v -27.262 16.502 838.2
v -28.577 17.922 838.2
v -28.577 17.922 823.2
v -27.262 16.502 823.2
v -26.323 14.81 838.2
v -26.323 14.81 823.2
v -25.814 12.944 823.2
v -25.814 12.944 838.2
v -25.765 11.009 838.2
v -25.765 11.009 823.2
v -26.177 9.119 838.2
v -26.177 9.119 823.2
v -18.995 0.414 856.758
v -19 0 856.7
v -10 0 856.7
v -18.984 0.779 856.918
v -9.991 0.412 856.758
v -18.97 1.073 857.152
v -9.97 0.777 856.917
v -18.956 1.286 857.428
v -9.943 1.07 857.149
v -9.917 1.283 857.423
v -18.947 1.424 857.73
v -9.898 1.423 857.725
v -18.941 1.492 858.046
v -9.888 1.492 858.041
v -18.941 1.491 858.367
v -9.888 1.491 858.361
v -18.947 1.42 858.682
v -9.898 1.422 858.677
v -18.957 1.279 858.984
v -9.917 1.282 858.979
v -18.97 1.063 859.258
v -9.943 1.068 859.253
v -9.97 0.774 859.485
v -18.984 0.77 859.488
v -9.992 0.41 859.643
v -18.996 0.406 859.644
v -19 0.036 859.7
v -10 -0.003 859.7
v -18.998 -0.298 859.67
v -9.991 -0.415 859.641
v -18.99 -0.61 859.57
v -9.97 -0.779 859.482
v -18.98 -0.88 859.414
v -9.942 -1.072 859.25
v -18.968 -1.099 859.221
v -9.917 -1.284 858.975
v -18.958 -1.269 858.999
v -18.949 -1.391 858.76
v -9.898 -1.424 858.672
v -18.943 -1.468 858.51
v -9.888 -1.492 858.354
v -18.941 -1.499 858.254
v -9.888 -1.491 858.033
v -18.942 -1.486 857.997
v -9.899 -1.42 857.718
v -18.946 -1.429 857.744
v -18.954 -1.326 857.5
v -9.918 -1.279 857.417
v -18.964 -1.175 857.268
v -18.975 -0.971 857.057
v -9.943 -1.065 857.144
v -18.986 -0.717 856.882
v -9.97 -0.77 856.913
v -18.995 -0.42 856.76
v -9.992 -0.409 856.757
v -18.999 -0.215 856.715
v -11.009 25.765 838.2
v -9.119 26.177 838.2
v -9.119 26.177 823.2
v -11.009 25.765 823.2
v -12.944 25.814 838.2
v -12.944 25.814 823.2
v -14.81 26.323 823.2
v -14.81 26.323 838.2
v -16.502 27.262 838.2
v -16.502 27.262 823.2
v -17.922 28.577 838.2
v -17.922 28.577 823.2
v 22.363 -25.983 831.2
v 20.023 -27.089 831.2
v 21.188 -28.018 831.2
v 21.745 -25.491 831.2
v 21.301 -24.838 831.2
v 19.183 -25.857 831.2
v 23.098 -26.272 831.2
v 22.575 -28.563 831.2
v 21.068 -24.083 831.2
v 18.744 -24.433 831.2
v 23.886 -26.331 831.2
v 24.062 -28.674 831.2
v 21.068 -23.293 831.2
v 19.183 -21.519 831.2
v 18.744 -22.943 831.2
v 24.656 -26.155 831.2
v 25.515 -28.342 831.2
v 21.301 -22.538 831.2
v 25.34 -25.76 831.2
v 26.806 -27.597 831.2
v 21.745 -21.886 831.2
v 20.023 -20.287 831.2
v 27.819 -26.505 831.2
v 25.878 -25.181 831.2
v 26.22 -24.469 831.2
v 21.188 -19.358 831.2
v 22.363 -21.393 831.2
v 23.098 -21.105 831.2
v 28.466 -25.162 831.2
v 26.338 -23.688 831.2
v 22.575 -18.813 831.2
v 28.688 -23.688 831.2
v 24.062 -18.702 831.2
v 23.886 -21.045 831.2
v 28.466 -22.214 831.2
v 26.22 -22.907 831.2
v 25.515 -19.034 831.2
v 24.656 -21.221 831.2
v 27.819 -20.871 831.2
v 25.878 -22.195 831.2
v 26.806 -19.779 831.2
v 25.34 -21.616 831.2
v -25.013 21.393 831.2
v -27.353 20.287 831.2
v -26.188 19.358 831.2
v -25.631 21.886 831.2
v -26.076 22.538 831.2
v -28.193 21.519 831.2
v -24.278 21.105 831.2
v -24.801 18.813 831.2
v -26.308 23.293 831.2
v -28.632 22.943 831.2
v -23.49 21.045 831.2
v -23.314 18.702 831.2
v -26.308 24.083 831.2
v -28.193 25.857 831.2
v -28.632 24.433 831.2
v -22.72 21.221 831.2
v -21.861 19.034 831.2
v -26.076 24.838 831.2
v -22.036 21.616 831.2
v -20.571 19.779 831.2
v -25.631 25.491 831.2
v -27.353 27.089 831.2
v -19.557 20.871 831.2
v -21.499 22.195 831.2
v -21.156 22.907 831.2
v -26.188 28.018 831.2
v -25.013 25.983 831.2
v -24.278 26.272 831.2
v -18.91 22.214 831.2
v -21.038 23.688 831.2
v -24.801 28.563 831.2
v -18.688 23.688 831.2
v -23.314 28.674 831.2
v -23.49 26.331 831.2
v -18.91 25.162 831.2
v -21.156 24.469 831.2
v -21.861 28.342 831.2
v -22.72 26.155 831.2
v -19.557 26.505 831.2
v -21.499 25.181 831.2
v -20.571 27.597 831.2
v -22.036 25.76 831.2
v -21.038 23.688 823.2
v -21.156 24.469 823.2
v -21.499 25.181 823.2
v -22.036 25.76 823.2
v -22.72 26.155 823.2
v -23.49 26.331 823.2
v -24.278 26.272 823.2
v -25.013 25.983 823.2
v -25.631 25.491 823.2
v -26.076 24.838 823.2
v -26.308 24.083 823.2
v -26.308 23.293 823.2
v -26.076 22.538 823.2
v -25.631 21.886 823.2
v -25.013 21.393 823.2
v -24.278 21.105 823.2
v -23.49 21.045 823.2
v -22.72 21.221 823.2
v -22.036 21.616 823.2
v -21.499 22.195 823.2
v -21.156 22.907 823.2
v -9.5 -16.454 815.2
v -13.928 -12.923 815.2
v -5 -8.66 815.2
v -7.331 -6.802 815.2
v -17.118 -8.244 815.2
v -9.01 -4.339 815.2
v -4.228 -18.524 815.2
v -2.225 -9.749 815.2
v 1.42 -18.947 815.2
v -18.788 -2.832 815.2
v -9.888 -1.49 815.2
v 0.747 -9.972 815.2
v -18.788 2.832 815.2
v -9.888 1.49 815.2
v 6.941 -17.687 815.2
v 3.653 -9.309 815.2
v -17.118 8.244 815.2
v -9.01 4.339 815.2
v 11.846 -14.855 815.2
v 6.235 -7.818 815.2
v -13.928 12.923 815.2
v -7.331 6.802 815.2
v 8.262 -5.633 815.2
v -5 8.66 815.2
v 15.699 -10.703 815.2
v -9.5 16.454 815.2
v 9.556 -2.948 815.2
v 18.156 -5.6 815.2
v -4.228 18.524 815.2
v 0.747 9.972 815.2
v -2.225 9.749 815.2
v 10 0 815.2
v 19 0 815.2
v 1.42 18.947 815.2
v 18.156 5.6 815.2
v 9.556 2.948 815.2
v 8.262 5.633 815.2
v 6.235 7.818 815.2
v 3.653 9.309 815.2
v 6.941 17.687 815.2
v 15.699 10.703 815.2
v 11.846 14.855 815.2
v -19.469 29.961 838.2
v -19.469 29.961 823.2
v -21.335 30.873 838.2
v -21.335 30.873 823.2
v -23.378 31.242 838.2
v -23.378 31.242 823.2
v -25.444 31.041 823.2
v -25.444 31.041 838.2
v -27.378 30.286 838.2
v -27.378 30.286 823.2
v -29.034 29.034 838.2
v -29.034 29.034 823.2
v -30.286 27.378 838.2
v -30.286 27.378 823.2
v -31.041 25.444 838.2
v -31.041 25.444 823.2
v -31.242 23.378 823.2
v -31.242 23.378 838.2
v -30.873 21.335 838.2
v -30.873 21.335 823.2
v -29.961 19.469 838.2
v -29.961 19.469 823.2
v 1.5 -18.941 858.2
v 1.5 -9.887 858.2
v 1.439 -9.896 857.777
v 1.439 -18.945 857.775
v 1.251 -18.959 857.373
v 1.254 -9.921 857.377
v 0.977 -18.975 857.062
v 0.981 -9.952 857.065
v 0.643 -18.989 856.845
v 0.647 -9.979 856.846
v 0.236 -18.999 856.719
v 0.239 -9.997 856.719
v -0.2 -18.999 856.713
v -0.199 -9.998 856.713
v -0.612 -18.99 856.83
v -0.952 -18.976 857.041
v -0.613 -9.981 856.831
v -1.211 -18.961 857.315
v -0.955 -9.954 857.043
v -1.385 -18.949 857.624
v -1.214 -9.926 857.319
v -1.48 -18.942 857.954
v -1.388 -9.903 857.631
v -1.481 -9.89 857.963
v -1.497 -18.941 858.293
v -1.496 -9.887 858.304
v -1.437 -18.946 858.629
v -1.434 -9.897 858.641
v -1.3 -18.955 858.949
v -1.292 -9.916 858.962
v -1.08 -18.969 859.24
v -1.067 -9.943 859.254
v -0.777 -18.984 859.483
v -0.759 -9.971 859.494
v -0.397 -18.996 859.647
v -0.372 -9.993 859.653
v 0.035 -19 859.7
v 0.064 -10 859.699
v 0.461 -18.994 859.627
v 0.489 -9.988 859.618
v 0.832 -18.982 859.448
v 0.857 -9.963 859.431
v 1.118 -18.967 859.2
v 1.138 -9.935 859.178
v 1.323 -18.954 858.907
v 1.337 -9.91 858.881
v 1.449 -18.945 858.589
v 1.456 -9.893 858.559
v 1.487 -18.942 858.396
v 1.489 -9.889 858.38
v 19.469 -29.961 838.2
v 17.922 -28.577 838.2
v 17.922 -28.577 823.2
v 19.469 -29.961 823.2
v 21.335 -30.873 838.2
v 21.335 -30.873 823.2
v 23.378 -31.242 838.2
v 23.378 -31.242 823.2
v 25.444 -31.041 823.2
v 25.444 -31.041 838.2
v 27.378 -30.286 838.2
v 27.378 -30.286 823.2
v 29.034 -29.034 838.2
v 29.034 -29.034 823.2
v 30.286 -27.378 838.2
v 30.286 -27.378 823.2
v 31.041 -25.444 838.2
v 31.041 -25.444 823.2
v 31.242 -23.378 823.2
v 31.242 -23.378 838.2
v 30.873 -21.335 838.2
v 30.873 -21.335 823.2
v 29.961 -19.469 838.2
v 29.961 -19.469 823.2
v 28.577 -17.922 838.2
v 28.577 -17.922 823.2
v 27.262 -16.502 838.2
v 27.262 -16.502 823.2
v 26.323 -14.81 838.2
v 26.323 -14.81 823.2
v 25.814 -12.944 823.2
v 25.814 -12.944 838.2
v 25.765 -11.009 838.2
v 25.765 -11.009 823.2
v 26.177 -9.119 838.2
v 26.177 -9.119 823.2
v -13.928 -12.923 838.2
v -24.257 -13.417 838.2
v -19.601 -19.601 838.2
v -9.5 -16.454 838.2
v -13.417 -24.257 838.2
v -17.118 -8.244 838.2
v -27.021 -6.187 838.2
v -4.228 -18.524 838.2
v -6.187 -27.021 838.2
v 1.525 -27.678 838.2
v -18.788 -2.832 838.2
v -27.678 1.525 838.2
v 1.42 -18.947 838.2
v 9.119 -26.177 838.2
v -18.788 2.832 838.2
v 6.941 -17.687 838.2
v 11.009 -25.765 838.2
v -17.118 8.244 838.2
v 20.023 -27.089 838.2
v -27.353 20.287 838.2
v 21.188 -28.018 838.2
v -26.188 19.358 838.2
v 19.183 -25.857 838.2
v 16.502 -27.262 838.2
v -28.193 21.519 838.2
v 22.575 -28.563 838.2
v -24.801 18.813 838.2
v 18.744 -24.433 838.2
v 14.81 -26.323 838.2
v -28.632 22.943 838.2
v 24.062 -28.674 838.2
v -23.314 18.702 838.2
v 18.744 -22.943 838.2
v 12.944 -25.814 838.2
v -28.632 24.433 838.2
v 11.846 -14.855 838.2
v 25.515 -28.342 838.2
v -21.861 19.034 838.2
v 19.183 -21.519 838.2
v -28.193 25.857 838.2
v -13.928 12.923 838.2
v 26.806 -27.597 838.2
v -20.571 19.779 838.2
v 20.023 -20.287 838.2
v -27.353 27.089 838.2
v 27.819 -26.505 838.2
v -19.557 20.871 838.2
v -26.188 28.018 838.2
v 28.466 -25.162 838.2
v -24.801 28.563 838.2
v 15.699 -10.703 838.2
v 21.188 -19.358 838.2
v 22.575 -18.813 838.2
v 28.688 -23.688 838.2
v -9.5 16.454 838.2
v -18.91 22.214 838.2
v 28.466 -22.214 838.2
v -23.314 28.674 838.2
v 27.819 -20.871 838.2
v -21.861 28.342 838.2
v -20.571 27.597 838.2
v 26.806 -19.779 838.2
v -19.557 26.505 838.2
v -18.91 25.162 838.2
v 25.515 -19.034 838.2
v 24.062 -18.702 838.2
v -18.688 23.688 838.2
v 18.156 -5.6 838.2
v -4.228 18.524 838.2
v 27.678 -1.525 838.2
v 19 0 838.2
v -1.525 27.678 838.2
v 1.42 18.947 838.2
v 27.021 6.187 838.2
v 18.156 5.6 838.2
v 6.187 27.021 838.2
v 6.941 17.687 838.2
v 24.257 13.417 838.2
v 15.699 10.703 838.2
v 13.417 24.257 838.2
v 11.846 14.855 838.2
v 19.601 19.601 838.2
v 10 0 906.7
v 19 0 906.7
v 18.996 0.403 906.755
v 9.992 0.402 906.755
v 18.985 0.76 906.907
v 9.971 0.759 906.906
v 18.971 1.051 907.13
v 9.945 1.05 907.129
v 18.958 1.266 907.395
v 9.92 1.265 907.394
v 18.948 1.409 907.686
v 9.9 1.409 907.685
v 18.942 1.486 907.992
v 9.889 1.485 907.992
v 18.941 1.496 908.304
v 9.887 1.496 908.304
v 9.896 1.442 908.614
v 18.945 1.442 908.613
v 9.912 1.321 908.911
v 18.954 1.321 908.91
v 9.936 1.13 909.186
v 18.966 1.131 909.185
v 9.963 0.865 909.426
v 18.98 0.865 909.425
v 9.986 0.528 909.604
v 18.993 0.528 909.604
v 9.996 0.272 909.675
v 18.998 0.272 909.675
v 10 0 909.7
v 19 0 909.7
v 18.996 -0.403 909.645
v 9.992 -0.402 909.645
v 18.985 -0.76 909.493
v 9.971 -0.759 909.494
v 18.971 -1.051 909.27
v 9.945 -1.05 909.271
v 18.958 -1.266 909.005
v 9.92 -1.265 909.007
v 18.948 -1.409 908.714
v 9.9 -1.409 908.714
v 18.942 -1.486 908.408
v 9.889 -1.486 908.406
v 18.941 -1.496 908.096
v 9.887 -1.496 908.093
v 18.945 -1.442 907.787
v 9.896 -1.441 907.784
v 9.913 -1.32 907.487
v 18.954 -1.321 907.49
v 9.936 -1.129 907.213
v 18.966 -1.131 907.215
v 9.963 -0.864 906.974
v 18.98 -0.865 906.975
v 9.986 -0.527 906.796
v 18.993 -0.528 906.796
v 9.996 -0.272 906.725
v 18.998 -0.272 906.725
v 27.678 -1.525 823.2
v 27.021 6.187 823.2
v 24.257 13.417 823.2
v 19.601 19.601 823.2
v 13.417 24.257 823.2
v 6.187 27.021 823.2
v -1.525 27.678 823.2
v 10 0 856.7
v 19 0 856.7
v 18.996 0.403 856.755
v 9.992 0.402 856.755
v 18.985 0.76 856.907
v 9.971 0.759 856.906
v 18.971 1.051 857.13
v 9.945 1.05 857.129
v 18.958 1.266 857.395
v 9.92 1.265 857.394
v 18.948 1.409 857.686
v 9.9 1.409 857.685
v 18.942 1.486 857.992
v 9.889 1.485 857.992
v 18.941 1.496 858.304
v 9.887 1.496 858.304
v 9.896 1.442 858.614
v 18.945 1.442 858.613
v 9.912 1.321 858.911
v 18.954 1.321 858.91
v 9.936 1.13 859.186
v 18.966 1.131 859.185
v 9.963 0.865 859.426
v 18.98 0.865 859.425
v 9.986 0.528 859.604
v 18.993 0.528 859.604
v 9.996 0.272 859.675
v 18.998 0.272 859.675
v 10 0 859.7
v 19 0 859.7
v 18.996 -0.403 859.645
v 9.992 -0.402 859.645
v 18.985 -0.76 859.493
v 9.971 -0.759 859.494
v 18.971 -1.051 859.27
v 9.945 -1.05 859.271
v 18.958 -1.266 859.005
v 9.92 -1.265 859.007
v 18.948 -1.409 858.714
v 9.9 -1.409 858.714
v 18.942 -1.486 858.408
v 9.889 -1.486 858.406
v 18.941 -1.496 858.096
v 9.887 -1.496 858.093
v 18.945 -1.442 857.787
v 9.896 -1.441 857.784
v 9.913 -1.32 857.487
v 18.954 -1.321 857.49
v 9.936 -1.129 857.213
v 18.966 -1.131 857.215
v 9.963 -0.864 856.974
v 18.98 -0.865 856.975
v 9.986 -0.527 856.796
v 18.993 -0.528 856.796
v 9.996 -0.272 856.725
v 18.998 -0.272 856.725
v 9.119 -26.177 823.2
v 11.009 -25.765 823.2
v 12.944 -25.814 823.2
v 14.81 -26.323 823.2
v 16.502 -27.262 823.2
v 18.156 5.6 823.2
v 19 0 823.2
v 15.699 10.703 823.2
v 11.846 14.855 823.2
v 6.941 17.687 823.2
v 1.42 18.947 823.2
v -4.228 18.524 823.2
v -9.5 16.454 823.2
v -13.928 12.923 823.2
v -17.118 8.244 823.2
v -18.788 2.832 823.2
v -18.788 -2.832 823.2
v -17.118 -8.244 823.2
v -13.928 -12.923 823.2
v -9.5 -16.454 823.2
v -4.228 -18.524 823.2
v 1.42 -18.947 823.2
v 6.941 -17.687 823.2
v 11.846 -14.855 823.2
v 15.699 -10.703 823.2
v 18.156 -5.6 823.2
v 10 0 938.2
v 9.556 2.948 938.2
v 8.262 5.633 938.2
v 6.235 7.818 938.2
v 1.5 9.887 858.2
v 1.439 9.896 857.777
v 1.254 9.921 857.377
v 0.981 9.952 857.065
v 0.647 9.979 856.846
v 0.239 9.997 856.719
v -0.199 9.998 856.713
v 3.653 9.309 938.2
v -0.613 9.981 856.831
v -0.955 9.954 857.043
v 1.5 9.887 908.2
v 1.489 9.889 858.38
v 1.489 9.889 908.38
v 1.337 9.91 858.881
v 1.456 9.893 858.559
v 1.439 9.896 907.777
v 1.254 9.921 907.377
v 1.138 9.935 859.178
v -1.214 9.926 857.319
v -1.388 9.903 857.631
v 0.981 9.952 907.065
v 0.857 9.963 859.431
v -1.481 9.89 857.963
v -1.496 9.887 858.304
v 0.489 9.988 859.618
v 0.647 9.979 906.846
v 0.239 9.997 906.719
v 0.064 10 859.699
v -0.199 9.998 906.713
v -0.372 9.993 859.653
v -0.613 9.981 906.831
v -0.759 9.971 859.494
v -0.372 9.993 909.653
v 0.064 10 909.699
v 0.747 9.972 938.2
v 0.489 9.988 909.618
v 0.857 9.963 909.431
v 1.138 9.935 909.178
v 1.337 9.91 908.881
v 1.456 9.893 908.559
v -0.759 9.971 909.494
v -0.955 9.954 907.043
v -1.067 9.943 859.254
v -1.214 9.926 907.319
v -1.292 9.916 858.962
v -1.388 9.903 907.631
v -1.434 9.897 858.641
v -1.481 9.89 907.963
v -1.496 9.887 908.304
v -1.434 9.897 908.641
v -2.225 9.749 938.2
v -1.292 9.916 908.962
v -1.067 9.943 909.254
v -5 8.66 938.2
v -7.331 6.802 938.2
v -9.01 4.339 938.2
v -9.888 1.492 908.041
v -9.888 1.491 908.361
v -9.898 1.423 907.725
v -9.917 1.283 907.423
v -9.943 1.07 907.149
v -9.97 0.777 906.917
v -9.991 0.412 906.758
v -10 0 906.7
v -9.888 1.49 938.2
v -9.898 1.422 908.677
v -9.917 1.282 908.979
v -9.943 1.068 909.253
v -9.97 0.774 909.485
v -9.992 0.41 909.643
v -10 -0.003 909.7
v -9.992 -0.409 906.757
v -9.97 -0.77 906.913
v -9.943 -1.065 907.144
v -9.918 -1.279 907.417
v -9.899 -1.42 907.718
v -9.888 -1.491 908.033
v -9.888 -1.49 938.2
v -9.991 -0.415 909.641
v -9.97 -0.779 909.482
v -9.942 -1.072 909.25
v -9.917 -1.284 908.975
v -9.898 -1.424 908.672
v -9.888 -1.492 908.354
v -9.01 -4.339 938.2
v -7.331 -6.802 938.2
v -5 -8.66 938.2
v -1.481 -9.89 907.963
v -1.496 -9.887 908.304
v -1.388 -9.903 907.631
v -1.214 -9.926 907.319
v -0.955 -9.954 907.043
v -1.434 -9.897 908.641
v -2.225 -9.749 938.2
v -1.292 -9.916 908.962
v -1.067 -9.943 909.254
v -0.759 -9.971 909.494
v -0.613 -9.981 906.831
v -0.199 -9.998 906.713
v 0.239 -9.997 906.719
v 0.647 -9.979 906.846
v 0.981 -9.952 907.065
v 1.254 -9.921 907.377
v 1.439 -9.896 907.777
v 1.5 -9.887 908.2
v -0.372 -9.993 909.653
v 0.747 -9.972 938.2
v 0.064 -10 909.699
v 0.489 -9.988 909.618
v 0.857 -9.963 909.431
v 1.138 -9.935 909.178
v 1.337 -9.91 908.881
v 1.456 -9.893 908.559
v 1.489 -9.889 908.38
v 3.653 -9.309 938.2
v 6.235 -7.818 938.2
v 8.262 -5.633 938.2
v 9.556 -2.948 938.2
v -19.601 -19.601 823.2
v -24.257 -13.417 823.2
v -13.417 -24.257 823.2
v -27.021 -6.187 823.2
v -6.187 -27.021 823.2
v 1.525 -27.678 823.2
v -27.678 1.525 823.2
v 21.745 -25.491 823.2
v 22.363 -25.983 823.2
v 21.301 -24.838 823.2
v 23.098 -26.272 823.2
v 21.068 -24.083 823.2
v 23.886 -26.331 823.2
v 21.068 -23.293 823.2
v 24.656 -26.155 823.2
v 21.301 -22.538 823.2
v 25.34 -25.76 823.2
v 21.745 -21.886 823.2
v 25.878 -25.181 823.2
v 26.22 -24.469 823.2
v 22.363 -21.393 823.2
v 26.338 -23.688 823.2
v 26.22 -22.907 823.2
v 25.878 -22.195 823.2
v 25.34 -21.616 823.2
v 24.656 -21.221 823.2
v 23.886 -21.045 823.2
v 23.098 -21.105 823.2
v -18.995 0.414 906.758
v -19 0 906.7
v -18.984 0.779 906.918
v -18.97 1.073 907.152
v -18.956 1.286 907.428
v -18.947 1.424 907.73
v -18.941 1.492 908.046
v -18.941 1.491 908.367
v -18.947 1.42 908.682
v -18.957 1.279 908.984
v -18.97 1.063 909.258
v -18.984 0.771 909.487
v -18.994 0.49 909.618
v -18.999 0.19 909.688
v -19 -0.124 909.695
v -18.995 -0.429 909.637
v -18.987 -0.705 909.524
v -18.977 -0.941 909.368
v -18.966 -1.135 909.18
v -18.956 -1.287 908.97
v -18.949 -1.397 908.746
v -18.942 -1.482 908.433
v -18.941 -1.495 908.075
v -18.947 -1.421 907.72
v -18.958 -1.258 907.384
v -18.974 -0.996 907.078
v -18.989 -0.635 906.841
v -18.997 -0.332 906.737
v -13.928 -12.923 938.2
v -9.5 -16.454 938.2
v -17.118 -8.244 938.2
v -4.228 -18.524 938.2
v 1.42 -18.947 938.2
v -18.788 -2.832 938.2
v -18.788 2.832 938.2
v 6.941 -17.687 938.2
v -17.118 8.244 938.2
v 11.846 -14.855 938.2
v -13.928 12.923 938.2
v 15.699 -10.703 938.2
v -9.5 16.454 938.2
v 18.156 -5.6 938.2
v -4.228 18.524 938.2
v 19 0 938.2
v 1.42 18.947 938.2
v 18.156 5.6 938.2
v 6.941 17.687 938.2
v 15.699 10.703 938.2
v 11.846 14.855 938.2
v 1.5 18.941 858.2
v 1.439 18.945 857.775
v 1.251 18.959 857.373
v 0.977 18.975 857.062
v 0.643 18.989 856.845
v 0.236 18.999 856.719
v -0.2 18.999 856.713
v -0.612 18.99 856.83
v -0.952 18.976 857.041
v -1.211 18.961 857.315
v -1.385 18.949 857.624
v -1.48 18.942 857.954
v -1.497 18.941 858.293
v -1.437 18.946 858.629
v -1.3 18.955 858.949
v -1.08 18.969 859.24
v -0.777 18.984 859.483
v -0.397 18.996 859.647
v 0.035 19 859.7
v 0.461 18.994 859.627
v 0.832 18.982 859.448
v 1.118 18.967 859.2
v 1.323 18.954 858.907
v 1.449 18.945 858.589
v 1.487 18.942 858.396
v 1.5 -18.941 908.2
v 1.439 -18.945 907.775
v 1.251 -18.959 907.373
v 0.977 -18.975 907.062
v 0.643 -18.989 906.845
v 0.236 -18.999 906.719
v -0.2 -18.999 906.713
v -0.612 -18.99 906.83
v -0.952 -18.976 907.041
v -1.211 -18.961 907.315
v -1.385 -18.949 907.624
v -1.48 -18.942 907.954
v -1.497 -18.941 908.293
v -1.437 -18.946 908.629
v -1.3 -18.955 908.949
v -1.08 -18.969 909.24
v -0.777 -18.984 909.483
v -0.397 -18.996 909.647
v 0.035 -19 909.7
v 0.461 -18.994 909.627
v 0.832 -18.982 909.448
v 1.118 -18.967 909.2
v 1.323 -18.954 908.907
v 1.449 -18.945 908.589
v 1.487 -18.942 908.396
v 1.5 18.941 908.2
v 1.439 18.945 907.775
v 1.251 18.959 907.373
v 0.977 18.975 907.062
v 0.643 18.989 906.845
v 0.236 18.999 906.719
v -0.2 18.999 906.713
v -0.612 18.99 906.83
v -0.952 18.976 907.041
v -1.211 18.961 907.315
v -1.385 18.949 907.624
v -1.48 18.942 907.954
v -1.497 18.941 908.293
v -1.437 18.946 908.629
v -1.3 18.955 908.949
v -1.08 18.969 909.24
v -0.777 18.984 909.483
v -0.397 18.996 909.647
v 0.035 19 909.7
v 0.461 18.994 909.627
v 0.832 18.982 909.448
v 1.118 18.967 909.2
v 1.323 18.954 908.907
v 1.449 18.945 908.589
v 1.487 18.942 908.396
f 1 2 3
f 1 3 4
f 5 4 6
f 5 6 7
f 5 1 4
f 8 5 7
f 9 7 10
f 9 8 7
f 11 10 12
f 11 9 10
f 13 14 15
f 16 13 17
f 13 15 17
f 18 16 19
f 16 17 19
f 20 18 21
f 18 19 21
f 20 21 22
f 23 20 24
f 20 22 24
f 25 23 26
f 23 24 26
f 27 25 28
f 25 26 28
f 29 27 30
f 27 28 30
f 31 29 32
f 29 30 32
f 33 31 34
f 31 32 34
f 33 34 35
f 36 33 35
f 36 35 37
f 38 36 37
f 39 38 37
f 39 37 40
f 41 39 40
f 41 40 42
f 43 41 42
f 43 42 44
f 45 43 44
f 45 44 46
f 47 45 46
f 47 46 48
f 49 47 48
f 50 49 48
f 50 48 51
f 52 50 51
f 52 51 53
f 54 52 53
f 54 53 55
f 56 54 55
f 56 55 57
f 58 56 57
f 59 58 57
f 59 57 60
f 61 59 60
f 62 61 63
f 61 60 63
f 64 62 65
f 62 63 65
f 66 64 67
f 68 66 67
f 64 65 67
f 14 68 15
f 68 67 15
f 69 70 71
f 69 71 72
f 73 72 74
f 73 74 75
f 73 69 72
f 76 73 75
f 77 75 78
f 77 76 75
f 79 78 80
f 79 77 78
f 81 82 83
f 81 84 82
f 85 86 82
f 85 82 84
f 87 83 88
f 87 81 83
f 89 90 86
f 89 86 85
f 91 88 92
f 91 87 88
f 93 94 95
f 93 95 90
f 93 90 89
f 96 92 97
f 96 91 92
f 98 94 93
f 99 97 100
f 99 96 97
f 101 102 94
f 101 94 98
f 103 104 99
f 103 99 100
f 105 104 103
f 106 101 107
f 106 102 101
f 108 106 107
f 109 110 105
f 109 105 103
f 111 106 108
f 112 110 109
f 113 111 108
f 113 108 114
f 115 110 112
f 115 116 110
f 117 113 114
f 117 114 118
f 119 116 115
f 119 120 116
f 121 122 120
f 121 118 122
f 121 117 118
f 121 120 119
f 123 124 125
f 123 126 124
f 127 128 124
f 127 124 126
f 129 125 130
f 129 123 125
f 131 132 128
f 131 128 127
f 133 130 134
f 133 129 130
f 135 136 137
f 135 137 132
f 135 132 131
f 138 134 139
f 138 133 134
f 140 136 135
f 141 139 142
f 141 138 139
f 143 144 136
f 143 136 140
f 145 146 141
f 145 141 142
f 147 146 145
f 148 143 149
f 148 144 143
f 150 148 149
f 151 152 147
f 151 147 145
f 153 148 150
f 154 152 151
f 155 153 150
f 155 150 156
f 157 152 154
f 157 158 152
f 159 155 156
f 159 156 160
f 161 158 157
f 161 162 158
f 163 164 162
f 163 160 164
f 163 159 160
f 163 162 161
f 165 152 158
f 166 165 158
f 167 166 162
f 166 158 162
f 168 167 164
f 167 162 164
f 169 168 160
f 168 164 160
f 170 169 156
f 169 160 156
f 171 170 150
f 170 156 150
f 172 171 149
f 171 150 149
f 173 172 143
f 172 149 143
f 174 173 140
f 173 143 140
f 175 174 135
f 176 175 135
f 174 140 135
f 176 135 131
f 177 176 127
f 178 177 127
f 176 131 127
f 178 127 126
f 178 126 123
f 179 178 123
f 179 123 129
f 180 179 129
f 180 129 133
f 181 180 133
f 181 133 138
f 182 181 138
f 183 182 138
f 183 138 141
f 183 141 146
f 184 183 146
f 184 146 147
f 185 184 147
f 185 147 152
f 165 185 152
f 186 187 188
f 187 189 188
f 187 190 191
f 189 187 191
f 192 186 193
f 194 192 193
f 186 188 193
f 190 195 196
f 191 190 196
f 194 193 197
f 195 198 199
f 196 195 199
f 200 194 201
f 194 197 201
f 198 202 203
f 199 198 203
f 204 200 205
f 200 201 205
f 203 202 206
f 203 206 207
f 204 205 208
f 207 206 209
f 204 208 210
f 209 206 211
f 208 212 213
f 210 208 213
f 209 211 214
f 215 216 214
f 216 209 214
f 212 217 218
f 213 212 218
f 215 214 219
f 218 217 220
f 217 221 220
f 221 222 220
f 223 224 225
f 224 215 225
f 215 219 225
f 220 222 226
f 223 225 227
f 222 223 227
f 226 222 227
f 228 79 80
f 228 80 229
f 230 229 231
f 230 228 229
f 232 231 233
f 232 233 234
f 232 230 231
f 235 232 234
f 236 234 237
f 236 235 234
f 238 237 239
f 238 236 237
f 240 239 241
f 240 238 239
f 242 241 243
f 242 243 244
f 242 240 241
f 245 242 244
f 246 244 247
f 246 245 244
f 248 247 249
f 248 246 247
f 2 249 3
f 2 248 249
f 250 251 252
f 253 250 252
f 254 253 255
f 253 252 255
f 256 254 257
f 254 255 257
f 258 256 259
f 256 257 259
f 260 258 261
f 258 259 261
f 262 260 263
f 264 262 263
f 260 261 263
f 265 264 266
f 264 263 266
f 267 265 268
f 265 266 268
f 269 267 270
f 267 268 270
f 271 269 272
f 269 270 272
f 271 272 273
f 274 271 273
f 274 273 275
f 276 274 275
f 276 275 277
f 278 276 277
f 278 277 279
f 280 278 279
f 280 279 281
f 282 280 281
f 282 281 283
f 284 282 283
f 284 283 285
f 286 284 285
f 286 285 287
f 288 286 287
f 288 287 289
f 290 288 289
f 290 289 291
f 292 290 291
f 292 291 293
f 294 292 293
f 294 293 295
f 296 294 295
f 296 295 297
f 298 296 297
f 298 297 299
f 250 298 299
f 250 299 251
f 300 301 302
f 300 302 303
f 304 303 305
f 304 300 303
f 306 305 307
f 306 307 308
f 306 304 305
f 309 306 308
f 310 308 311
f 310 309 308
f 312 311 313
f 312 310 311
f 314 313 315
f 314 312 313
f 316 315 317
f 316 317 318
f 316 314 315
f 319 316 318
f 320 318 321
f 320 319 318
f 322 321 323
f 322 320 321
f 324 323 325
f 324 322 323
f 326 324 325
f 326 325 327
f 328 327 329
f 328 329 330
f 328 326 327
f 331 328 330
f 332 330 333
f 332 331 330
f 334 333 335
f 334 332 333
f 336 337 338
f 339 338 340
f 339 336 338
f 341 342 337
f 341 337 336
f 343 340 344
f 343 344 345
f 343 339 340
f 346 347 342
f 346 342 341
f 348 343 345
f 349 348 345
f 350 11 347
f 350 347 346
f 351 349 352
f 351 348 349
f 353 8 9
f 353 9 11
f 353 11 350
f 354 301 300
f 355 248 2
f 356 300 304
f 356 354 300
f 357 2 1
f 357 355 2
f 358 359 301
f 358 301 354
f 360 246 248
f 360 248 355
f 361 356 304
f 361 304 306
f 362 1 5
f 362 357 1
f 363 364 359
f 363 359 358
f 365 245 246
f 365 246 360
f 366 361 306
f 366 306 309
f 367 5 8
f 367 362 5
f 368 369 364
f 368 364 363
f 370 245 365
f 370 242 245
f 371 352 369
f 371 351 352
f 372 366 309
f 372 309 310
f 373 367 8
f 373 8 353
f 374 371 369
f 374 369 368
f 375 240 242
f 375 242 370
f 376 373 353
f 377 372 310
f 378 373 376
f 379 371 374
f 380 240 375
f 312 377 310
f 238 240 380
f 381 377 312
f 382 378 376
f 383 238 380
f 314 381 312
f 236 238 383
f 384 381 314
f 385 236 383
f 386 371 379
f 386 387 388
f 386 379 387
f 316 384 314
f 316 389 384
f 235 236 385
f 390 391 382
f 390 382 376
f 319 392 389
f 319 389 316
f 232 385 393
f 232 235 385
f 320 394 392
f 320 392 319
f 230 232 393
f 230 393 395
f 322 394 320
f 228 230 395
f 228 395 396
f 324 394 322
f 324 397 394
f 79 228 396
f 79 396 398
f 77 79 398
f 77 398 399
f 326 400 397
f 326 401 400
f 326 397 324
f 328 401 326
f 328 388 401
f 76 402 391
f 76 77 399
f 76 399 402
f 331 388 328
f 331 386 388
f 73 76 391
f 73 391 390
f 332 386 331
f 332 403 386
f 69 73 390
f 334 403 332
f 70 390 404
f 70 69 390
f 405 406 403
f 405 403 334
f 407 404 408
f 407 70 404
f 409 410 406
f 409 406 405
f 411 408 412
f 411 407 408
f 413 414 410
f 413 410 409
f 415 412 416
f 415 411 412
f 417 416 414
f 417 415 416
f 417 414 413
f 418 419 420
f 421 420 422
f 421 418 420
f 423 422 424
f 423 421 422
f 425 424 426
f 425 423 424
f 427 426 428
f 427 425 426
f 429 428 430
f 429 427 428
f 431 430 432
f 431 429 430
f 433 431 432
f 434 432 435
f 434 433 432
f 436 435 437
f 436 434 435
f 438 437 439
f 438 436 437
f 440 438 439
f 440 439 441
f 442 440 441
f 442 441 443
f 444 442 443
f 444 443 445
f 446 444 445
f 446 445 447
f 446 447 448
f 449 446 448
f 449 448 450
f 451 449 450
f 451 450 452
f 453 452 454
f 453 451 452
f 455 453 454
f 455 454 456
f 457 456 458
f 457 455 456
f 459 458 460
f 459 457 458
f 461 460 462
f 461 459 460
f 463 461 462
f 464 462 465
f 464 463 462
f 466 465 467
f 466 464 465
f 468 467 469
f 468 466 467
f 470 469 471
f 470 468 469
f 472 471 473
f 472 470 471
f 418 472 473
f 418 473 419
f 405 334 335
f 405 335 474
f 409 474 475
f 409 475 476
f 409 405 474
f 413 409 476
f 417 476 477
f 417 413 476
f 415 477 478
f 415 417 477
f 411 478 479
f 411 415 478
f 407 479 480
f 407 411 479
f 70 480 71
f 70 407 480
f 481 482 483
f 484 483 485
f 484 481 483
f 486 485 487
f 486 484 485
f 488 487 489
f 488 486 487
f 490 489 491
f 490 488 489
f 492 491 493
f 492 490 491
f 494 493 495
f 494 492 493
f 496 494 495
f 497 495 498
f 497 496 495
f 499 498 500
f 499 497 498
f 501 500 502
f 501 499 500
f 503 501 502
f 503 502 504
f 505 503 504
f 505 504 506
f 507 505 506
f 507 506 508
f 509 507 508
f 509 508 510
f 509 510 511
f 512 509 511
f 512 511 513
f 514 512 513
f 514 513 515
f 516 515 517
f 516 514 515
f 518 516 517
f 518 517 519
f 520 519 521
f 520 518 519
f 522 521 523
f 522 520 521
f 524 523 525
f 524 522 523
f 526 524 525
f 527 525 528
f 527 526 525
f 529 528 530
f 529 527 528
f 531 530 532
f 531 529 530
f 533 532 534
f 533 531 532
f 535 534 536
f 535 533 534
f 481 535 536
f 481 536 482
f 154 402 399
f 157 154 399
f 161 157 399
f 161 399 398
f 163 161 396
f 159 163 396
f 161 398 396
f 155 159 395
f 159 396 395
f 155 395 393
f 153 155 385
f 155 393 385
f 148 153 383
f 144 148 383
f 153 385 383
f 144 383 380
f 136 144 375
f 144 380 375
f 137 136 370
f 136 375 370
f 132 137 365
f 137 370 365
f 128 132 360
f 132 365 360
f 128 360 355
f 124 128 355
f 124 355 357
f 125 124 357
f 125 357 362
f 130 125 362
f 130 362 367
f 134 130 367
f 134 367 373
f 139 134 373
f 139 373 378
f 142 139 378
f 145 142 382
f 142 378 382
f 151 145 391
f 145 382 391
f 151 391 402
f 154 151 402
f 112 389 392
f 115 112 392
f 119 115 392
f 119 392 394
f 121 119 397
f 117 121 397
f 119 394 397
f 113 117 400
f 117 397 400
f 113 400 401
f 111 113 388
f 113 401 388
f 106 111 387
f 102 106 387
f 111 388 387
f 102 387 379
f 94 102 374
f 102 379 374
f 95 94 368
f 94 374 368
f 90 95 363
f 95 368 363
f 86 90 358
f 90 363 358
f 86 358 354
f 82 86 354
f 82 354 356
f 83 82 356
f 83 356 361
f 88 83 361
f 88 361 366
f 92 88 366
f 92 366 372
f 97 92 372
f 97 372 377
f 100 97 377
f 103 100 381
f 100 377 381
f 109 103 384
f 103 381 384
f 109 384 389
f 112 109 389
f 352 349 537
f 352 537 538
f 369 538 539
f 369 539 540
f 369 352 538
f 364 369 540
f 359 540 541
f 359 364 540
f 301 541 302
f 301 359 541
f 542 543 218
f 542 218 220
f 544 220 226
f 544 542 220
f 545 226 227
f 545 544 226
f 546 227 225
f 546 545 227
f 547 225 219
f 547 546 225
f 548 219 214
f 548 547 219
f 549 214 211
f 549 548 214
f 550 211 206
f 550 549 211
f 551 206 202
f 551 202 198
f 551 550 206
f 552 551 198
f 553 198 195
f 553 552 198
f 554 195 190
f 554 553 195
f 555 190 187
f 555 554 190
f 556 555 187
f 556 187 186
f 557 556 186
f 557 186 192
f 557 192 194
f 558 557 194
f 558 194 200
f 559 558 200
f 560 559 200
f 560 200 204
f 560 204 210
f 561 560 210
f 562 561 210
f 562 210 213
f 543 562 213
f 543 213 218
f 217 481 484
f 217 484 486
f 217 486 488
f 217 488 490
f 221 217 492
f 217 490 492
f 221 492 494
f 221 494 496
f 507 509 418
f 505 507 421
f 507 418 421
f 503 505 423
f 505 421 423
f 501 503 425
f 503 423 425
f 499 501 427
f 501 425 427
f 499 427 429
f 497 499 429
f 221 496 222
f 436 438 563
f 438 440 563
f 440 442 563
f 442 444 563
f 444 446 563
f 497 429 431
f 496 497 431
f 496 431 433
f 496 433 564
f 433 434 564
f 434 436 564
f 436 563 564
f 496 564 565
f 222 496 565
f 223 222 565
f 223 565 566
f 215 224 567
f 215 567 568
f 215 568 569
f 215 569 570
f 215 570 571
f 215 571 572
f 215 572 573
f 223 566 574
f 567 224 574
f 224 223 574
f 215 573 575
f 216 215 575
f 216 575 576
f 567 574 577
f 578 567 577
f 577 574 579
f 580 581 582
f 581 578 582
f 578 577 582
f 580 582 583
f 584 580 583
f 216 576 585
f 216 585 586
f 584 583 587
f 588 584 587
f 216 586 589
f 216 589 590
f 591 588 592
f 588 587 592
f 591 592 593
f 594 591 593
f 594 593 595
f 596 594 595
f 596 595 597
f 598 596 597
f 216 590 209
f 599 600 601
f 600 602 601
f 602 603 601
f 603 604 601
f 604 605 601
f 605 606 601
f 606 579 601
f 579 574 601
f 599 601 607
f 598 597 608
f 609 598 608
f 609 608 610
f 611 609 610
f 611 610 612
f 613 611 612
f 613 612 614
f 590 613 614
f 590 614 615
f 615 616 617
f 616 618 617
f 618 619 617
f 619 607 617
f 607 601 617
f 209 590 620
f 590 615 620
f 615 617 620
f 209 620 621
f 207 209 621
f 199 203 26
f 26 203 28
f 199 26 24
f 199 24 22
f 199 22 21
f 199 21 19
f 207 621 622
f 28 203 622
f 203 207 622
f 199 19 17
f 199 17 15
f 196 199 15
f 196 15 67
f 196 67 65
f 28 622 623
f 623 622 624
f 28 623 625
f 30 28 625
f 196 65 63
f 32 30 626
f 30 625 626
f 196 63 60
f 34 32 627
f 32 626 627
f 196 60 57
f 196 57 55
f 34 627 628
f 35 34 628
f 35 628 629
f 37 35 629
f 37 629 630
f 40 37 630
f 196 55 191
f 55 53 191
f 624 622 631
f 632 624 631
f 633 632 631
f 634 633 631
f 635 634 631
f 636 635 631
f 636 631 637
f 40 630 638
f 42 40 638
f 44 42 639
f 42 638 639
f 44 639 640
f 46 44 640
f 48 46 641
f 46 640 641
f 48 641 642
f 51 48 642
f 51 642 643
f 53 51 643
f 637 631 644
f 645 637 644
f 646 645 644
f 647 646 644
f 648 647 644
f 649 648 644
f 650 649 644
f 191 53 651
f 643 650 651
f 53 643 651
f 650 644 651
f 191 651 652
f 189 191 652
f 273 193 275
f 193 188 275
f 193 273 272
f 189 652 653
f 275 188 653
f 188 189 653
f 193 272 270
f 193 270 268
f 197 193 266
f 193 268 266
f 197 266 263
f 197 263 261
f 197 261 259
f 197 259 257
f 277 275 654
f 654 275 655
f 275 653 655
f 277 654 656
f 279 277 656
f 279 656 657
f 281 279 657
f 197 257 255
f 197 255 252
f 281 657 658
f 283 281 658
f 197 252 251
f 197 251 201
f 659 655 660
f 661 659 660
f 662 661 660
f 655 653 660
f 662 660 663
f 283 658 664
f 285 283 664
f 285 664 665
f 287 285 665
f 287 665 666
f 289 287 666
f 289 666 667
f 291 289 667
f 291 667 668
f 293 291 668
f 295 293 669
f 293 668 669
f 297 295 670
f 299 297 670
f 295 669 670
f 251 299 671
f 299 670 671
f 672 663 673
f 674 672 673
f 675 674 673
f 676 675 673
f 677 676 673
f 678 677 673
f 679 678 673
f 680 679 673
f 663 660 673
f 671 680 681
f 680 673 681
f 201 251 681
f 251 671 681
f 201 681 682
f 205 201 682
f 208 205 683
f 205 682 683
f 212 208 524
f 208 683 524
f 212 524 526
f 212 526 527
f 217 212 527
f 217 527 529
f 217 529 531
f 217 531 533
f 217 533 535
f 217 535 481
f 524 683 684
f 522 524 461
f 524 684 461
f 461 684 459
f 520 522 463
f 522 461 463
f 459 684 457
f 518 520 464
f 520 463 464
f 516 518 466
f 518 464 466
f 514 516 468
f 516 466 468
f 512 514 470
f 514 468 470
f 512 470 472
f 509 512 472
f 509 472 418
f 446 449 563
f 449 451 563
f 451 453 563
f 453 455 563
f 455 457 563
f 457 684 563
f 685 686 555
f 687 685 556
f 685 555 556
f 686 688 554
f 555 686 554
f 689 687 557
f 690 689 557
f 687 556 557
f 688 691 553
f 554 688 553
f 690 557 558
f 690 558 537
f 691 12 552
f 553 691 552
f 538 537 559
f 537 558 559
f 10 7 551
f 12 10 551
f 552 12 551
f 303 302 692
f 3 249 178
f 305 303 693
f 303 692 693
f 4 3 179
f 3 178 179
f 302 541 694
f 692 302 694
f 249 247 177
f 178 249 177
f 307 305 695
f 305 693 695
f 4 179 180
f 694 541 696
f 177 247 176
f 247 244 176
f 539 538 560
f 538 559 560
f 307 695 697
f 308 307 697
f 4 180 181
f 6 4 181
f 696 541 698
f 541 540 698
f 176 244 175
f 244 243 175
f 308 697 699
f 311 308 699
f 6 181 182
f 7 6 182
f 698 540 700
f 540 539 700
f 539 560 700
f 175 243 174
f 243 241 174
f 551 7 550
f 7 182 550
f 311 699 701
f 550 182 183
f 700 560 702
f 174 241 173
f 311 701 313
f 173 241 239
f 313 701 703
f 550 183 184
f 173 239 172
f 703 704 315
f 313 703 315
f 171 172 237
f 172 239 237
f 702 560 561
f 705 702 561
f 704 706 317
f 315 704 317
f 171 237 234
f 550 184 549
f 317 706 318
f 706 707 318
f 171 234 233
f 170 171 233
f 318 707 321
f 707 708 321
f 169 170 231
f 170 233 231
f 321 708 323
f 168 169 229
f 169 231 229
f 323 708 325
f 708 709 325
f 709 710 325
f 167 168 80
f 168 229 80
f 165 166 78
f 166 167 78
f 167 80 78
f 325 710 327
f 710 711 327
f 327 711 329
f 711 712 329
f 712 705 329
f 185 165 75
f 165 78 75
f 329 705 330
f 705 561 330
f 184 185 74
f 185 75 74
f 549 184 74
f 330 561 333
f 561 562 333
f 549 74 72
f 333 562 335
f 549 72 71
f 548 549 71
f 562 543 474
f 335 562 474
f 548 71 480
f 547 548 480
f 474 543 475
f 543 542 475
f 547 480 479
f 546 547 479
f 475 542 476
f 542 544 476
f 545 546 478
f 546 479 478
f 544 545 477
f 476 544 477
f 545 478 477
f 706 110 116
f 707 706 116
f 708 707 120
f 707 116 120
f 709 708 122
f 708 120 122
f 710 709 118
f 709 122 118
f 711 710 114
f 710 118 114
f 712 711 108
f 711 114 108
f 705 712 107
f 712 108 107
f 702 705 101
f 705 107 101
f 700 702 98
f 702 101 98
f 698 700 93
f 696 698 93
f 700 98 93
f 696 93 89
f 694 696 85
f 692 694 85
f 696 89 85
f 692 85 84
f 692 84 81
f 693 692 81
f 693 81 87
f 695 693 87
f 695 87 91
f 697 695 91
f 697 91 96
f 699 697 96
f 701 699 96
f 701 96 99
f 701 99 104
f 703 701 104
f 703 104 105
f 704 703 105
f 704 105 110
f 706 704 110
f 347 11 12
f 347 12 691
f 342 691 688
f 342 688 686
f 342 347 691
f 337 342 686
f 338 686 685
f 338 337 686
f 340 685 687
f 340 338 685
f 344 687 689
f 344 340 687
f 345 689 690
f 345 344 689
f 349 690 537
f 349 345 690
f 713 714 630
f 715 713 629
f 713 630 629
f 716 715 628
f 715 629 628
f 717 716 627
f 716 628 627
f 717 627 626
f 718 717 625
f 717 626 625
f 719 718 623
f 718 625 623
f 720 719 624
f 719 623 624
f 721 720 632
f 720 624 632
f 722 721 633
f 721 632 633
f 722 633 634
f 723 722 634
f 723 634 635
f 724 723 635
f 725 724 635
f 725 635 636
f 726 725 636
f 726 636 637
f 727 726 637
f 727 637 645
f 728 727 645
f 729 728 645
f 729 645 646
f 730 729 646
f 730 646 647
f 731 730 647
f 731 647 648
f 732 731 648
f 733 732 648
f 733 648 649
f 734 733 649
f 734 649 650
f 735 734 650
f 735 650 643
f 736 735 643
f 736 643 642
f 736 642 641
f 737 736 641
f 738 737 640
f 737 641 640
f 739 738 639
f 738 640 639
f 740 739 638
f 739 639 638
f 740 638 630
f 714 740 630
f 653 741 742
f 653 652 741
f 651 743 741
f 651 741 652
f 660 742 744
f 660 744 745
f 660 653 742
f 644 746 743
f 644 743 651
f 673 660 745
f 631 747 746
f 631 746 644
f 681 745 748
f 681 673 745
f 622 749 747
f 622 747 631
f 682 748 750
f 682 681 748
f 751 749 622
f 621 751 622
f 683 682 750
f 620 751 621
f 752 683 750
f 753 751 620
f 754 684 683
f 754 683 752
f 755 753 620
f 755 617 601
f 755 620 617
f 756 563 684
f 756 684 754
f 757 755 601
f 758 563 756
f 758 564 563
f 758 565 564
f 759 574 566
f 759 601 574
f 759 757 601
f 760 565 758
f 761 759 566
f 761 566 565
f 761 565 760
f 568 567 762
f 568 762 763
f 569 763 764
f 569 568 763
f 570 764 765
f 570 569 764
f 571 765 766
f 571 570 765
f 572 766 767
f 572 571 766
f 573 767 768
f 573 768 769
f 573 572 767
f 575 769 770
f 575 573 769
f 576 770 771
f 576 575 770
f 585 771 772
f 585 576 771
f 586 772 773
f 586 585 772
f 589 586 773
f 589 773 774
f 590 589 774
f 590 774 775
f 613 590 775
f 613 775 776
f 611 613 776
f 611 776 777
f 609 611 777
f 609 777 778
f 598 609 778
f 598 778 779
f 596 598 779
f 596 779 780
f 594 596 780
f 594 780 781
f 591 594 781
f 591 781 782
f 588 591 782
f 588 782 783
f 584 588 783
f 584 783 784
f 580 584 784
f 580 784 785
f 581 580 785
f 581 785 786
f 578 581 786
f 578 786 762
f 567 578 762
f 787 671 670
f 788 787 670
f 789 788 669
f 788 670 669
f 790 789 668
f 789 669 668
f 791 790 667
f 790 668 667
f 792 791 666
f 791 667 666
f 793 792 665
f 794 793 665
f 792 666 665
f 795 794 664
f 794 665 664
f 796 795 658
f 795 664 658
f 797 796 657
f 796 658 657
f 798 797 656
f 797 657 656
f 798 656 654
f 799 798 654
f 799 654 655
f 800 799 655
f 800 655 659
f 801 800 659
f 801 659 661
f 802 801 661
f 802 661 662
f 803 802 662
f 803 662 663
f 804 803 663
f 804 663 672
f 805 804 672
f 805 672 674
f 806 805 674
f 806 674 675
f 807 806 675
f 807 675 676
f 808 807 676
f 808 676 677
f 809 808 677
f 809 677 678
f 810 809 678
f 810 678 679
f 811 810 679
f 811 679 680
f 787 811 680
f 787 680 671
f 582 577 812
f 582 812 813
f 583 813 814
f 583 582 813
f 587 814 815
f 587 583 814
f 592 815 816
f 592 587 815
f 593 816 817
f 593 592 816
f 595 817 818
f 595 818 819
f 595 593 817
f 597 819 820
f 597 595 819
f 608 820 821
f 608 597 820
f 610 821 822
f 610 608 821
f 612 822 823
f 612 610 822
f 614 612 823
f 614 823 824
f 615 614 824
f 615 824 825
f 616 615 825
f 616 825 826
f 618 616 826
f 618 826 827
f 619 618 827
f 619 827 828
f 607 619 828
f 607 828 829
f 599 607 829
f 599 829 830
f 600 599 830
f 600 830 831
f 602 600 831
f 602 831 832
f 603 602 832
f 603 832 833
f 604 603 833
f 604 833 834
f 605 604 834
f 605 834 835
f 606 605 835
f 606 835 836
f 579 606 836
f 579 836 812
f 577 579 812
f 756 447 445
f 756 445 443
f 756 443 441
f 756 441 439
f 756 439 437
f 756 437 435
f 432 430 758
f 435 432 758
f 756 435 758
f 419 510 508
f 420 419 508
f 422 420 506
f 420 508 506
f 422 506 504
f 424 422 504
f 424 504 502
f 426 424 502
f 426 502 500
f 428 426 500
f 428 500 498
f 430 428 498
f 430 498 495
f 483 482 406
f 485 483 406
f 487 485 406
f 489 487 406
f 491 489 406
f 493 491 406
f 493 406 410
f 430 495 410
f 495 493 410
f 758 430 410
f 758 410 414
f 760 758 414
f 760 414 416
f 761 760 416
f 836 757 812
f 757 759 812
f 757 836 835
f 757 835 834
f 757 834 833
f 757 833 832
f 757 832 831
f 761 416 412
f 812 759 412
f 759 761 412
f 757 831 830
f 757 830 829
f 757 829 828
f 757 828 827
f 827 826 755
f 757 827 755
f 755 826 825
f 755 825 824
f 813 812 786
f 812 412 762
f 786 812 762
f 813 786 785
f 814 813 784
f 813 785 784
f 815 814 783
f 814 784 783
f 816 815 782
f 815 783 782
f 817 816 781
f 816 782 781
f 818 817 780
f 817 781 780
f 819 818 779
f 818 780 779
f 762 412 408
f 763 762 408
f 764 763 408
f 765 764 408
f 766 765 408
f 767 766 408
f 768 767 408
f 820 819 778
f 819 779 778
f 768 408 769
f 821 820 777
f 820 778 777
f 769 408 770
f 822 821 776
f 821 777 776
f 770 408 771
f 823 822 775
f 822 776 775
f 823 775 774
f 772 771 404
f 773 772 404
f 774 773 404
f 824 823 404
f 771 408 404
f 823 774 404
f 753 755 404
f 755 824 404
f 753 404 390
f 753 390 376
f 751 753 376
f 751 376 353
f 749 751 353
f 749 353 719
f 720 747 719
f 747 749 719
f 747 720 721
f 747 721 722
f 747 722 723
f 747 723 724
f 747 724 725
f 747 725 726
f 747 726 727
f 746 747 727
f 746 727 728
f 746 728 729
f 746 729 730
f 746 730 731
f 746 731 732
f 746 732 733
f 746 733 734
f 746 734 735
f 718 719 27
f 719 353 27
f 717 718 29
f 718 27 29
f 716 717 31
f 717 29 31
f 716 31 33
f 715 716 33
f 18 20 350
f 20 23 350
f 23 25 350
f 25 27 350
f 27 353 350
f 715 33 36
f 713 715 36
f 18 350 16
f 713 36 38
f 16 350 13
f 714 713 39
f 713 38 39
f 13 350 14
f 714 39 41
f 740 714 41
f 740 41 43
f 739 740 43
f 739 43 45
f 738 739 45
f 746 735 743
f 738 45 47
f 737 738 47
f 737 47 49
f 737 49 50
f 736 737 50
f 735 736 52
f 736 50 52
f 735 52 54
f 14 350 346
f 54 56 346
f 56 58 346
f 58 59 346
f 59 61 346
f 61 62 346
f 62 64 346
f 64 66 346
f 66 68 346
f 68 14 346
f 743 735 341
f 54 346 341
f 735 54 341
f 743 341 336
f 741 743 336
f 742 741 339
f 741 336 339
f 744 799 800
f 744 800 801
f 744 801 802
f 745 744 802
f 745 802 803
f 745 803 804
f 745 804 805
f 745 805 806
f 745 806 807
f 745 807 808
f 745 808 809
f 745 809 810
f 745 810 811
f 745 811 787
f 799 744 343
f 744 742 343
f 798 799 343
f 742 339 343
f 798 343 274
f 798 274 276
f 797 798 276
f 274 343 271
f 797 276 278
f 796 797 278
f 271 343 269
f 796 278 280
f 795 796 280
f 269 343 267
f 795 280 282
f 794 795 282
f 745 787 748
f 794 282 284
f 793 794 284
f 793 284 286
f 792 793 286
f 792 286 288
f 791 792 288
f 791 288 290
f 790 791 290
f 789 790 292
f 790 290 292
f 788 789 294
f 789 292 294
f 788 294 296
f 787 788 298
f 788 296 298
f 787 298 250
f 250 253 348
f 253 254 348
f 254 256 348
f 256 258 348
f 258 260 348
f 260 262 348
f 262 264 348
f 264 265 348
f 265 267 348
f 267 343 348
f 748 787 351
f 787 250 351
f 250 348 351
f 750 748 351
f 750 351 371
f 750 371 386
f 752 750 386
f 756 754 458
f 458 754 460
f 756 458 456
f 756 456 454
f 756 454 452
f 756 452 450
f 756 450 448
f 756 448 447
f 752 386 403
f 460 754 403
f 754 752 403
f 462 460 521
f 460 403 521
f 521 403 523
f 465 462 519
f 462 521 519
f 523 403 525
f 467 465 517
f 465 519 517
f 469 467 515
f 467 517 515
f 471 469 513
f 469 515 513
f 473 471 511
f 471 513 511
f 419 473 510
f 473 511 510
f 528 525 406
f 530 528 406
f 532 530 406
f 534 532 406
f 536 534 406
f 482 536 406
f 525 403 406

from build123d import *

# Parameters (mm, degrees)
ESQUISSE1_R                  = 2.65
BOSS_EXTRU_1_DEPTH           = 15
ESQUISSE9_R                  = 19
BOSS_EXTRU_4_DEPTH           = 100
BOSS_EXTRU_4_DEPTH_BACK      = 23
ESQUISSE12_R                 = 10
ENL_V_MAT_EXTRU_2_DEPTH      = 124
ESQUISSE13_R                 = 5
ENL_V_MAT_EXTRU_3_DEPTH      = 7
ESQUISSE14_R                 = 1.5
ENL_V_MAT_EXTRU_4_DEPTH      = 32.248101798
ENL_V_MAT_EXTRU_4_DEPTH_BACK = 32.248101798
ESQUISSE15_R                 = 1.5
ENL_V_MAT_EXTRU_5_DEPTH      = 32.248101798
ENL_V_MAT_EXTRU_5_DEPTH_BACK = 32.248101798


with BuildPart() as part:
    # Esquisse1 → Boss.-Extru.1 (new body)
    with BuildSketch(Plane.XY.offset(838.2)):
        with BuildLine():
            ThreePointArc((-9.11861011, 26.177363431), (-13.892343586, 26.012514183), (-17.921893066, 28.577360682))
            ThreePointArc((-17.921893066, 28.577360682), (-29.033821851, 29.033821851), (-28.577360682, 17.921893066))
            ThreePointArc((-28.577360682, 17.921893066), (-26.012514183, 13.892343586), (-26.177363431, 9.11861011))
            ThreePointArc((-26.177363431, 9.11861011), (-19.60106383, -19.60106383), (9.11861011, -26.177363431))
            ThreePointArc((9.11861011, -26.177363431), (13.892343586, -26.012514183), (17.921893066, -28.577360682))
            ThreePointArc((17.921893066, -28.577360682), (29.033821851, -29.033821851), (28.577360682, -17.921893066))
            ThreePointArc((28.577360682, -17.921893066), (26.012514183, -13.892343586), (26.177363431, -9.11861011))
            ThreePointArc((26.177363431, -9.11861011), (19.60106383, 19.60106383), (-9.11861011, 26.177363431))
        make_face()
        with Locations((23.68807717, -23.68807717)):
            Circle(ESQUISSE1_R, mode=Mode.SUBTRACT)
        with Locations((-23.68807717, 23.68807717)):
            Circle(ESQUISSE1_R, mode=Mode.SUBTRACT)
    extrude(amount=-BOSS_EXTRU_1_DEPTH)

    # Esquisse9 → Boss.-Extru.4 (add, two sides)
    with BuildSketch(Plane.XY.offset(838.2)) as boss_extru_4_sk:
        Circle(ESQUISSE9_R)
    extrude(amount=BOSS_EXTRU_4_DEPTH)
    extrude(boss_extru_4_sk.sketch, amount=-BOSS_EXTRU_4_DEPTH_BACK)

    # Esquisse12 → Enlèv. mat.-Extru.2 (cut, through all)
    with BuildSketch(Plane.XY.offset(938.2)):
        Circle(ESQUISSE12_R)
    extrude(amount=-ENL_V_MAT_EXTRU_2_DEPTH, mode=Mode.SUBTRACT)

    # Esquisse13 → Enlèv. mat.-Extru.3 (cut)
    with BuildSketch(Plane.XY.offset(838.2)):
        with Locations((-23.68807717, 23.68807717)):
            Circle(ESQUISSE13_R)
        with Locations((23.68807717, -23.68807717)):
            Circle(ESQUISSE13_R)
    extrude(amount=-ENL_V_MAT_EXTRU_3_DEPTH, mode=Mode.SUBTRACT)

    # Esquisse14 → Enlèv. mat.-Extru.4 (cut, two sides)
    with BuildSketch(Plane(origin=(0, 0, 0), x_dir=(1, 0, 0), z_dir=(0, 1, 0))) as enl_v_mat_extru_4_sk:
        with Locations((0, -858.2)):
            Circle(ESQUISSE14_R)
        with Locations((0, -908.2)):
            Circle(ESQUISSE14_R)
    extrude(amount=ENL_V_MAT_EXTRU_4_DEPTH, mode=Mode.SUBTRACT)
    extrude(enl_v_mat_extru_4_sk.sketch, amount=-ENL_V_MAT_EXTRU_4_DEPTH_BACK, mode=Mode.SUBTRACT)

    # Esquisse15 → Enlèv. mat.-Extru.5 (cut, two sides)
    with BuildSketch(Plane(origin=(0, 0, 0), x_dir=(0, 0, -1), z_dir=(1, 0, 0))) as enl_v_mat_extru_5_sk:
        with Locations((-858.2, 0)):
            Circle(ESQUISSE15_R)
        with Locations((-908.2, 0)):
            Circle(ESQUISSE15_R)
    extrude(amount=ENL_V_MAT_EXTRU_5_DEPTH, mode=Mode.SUBTRACT)
    extrude(enl_v_mat_extru_5_sk.sketch, amount=-ENL_V_MAT_EXTRU_5_DEPTH_BACK, mode=Mode.SUBTRACT)


solid = part.part
